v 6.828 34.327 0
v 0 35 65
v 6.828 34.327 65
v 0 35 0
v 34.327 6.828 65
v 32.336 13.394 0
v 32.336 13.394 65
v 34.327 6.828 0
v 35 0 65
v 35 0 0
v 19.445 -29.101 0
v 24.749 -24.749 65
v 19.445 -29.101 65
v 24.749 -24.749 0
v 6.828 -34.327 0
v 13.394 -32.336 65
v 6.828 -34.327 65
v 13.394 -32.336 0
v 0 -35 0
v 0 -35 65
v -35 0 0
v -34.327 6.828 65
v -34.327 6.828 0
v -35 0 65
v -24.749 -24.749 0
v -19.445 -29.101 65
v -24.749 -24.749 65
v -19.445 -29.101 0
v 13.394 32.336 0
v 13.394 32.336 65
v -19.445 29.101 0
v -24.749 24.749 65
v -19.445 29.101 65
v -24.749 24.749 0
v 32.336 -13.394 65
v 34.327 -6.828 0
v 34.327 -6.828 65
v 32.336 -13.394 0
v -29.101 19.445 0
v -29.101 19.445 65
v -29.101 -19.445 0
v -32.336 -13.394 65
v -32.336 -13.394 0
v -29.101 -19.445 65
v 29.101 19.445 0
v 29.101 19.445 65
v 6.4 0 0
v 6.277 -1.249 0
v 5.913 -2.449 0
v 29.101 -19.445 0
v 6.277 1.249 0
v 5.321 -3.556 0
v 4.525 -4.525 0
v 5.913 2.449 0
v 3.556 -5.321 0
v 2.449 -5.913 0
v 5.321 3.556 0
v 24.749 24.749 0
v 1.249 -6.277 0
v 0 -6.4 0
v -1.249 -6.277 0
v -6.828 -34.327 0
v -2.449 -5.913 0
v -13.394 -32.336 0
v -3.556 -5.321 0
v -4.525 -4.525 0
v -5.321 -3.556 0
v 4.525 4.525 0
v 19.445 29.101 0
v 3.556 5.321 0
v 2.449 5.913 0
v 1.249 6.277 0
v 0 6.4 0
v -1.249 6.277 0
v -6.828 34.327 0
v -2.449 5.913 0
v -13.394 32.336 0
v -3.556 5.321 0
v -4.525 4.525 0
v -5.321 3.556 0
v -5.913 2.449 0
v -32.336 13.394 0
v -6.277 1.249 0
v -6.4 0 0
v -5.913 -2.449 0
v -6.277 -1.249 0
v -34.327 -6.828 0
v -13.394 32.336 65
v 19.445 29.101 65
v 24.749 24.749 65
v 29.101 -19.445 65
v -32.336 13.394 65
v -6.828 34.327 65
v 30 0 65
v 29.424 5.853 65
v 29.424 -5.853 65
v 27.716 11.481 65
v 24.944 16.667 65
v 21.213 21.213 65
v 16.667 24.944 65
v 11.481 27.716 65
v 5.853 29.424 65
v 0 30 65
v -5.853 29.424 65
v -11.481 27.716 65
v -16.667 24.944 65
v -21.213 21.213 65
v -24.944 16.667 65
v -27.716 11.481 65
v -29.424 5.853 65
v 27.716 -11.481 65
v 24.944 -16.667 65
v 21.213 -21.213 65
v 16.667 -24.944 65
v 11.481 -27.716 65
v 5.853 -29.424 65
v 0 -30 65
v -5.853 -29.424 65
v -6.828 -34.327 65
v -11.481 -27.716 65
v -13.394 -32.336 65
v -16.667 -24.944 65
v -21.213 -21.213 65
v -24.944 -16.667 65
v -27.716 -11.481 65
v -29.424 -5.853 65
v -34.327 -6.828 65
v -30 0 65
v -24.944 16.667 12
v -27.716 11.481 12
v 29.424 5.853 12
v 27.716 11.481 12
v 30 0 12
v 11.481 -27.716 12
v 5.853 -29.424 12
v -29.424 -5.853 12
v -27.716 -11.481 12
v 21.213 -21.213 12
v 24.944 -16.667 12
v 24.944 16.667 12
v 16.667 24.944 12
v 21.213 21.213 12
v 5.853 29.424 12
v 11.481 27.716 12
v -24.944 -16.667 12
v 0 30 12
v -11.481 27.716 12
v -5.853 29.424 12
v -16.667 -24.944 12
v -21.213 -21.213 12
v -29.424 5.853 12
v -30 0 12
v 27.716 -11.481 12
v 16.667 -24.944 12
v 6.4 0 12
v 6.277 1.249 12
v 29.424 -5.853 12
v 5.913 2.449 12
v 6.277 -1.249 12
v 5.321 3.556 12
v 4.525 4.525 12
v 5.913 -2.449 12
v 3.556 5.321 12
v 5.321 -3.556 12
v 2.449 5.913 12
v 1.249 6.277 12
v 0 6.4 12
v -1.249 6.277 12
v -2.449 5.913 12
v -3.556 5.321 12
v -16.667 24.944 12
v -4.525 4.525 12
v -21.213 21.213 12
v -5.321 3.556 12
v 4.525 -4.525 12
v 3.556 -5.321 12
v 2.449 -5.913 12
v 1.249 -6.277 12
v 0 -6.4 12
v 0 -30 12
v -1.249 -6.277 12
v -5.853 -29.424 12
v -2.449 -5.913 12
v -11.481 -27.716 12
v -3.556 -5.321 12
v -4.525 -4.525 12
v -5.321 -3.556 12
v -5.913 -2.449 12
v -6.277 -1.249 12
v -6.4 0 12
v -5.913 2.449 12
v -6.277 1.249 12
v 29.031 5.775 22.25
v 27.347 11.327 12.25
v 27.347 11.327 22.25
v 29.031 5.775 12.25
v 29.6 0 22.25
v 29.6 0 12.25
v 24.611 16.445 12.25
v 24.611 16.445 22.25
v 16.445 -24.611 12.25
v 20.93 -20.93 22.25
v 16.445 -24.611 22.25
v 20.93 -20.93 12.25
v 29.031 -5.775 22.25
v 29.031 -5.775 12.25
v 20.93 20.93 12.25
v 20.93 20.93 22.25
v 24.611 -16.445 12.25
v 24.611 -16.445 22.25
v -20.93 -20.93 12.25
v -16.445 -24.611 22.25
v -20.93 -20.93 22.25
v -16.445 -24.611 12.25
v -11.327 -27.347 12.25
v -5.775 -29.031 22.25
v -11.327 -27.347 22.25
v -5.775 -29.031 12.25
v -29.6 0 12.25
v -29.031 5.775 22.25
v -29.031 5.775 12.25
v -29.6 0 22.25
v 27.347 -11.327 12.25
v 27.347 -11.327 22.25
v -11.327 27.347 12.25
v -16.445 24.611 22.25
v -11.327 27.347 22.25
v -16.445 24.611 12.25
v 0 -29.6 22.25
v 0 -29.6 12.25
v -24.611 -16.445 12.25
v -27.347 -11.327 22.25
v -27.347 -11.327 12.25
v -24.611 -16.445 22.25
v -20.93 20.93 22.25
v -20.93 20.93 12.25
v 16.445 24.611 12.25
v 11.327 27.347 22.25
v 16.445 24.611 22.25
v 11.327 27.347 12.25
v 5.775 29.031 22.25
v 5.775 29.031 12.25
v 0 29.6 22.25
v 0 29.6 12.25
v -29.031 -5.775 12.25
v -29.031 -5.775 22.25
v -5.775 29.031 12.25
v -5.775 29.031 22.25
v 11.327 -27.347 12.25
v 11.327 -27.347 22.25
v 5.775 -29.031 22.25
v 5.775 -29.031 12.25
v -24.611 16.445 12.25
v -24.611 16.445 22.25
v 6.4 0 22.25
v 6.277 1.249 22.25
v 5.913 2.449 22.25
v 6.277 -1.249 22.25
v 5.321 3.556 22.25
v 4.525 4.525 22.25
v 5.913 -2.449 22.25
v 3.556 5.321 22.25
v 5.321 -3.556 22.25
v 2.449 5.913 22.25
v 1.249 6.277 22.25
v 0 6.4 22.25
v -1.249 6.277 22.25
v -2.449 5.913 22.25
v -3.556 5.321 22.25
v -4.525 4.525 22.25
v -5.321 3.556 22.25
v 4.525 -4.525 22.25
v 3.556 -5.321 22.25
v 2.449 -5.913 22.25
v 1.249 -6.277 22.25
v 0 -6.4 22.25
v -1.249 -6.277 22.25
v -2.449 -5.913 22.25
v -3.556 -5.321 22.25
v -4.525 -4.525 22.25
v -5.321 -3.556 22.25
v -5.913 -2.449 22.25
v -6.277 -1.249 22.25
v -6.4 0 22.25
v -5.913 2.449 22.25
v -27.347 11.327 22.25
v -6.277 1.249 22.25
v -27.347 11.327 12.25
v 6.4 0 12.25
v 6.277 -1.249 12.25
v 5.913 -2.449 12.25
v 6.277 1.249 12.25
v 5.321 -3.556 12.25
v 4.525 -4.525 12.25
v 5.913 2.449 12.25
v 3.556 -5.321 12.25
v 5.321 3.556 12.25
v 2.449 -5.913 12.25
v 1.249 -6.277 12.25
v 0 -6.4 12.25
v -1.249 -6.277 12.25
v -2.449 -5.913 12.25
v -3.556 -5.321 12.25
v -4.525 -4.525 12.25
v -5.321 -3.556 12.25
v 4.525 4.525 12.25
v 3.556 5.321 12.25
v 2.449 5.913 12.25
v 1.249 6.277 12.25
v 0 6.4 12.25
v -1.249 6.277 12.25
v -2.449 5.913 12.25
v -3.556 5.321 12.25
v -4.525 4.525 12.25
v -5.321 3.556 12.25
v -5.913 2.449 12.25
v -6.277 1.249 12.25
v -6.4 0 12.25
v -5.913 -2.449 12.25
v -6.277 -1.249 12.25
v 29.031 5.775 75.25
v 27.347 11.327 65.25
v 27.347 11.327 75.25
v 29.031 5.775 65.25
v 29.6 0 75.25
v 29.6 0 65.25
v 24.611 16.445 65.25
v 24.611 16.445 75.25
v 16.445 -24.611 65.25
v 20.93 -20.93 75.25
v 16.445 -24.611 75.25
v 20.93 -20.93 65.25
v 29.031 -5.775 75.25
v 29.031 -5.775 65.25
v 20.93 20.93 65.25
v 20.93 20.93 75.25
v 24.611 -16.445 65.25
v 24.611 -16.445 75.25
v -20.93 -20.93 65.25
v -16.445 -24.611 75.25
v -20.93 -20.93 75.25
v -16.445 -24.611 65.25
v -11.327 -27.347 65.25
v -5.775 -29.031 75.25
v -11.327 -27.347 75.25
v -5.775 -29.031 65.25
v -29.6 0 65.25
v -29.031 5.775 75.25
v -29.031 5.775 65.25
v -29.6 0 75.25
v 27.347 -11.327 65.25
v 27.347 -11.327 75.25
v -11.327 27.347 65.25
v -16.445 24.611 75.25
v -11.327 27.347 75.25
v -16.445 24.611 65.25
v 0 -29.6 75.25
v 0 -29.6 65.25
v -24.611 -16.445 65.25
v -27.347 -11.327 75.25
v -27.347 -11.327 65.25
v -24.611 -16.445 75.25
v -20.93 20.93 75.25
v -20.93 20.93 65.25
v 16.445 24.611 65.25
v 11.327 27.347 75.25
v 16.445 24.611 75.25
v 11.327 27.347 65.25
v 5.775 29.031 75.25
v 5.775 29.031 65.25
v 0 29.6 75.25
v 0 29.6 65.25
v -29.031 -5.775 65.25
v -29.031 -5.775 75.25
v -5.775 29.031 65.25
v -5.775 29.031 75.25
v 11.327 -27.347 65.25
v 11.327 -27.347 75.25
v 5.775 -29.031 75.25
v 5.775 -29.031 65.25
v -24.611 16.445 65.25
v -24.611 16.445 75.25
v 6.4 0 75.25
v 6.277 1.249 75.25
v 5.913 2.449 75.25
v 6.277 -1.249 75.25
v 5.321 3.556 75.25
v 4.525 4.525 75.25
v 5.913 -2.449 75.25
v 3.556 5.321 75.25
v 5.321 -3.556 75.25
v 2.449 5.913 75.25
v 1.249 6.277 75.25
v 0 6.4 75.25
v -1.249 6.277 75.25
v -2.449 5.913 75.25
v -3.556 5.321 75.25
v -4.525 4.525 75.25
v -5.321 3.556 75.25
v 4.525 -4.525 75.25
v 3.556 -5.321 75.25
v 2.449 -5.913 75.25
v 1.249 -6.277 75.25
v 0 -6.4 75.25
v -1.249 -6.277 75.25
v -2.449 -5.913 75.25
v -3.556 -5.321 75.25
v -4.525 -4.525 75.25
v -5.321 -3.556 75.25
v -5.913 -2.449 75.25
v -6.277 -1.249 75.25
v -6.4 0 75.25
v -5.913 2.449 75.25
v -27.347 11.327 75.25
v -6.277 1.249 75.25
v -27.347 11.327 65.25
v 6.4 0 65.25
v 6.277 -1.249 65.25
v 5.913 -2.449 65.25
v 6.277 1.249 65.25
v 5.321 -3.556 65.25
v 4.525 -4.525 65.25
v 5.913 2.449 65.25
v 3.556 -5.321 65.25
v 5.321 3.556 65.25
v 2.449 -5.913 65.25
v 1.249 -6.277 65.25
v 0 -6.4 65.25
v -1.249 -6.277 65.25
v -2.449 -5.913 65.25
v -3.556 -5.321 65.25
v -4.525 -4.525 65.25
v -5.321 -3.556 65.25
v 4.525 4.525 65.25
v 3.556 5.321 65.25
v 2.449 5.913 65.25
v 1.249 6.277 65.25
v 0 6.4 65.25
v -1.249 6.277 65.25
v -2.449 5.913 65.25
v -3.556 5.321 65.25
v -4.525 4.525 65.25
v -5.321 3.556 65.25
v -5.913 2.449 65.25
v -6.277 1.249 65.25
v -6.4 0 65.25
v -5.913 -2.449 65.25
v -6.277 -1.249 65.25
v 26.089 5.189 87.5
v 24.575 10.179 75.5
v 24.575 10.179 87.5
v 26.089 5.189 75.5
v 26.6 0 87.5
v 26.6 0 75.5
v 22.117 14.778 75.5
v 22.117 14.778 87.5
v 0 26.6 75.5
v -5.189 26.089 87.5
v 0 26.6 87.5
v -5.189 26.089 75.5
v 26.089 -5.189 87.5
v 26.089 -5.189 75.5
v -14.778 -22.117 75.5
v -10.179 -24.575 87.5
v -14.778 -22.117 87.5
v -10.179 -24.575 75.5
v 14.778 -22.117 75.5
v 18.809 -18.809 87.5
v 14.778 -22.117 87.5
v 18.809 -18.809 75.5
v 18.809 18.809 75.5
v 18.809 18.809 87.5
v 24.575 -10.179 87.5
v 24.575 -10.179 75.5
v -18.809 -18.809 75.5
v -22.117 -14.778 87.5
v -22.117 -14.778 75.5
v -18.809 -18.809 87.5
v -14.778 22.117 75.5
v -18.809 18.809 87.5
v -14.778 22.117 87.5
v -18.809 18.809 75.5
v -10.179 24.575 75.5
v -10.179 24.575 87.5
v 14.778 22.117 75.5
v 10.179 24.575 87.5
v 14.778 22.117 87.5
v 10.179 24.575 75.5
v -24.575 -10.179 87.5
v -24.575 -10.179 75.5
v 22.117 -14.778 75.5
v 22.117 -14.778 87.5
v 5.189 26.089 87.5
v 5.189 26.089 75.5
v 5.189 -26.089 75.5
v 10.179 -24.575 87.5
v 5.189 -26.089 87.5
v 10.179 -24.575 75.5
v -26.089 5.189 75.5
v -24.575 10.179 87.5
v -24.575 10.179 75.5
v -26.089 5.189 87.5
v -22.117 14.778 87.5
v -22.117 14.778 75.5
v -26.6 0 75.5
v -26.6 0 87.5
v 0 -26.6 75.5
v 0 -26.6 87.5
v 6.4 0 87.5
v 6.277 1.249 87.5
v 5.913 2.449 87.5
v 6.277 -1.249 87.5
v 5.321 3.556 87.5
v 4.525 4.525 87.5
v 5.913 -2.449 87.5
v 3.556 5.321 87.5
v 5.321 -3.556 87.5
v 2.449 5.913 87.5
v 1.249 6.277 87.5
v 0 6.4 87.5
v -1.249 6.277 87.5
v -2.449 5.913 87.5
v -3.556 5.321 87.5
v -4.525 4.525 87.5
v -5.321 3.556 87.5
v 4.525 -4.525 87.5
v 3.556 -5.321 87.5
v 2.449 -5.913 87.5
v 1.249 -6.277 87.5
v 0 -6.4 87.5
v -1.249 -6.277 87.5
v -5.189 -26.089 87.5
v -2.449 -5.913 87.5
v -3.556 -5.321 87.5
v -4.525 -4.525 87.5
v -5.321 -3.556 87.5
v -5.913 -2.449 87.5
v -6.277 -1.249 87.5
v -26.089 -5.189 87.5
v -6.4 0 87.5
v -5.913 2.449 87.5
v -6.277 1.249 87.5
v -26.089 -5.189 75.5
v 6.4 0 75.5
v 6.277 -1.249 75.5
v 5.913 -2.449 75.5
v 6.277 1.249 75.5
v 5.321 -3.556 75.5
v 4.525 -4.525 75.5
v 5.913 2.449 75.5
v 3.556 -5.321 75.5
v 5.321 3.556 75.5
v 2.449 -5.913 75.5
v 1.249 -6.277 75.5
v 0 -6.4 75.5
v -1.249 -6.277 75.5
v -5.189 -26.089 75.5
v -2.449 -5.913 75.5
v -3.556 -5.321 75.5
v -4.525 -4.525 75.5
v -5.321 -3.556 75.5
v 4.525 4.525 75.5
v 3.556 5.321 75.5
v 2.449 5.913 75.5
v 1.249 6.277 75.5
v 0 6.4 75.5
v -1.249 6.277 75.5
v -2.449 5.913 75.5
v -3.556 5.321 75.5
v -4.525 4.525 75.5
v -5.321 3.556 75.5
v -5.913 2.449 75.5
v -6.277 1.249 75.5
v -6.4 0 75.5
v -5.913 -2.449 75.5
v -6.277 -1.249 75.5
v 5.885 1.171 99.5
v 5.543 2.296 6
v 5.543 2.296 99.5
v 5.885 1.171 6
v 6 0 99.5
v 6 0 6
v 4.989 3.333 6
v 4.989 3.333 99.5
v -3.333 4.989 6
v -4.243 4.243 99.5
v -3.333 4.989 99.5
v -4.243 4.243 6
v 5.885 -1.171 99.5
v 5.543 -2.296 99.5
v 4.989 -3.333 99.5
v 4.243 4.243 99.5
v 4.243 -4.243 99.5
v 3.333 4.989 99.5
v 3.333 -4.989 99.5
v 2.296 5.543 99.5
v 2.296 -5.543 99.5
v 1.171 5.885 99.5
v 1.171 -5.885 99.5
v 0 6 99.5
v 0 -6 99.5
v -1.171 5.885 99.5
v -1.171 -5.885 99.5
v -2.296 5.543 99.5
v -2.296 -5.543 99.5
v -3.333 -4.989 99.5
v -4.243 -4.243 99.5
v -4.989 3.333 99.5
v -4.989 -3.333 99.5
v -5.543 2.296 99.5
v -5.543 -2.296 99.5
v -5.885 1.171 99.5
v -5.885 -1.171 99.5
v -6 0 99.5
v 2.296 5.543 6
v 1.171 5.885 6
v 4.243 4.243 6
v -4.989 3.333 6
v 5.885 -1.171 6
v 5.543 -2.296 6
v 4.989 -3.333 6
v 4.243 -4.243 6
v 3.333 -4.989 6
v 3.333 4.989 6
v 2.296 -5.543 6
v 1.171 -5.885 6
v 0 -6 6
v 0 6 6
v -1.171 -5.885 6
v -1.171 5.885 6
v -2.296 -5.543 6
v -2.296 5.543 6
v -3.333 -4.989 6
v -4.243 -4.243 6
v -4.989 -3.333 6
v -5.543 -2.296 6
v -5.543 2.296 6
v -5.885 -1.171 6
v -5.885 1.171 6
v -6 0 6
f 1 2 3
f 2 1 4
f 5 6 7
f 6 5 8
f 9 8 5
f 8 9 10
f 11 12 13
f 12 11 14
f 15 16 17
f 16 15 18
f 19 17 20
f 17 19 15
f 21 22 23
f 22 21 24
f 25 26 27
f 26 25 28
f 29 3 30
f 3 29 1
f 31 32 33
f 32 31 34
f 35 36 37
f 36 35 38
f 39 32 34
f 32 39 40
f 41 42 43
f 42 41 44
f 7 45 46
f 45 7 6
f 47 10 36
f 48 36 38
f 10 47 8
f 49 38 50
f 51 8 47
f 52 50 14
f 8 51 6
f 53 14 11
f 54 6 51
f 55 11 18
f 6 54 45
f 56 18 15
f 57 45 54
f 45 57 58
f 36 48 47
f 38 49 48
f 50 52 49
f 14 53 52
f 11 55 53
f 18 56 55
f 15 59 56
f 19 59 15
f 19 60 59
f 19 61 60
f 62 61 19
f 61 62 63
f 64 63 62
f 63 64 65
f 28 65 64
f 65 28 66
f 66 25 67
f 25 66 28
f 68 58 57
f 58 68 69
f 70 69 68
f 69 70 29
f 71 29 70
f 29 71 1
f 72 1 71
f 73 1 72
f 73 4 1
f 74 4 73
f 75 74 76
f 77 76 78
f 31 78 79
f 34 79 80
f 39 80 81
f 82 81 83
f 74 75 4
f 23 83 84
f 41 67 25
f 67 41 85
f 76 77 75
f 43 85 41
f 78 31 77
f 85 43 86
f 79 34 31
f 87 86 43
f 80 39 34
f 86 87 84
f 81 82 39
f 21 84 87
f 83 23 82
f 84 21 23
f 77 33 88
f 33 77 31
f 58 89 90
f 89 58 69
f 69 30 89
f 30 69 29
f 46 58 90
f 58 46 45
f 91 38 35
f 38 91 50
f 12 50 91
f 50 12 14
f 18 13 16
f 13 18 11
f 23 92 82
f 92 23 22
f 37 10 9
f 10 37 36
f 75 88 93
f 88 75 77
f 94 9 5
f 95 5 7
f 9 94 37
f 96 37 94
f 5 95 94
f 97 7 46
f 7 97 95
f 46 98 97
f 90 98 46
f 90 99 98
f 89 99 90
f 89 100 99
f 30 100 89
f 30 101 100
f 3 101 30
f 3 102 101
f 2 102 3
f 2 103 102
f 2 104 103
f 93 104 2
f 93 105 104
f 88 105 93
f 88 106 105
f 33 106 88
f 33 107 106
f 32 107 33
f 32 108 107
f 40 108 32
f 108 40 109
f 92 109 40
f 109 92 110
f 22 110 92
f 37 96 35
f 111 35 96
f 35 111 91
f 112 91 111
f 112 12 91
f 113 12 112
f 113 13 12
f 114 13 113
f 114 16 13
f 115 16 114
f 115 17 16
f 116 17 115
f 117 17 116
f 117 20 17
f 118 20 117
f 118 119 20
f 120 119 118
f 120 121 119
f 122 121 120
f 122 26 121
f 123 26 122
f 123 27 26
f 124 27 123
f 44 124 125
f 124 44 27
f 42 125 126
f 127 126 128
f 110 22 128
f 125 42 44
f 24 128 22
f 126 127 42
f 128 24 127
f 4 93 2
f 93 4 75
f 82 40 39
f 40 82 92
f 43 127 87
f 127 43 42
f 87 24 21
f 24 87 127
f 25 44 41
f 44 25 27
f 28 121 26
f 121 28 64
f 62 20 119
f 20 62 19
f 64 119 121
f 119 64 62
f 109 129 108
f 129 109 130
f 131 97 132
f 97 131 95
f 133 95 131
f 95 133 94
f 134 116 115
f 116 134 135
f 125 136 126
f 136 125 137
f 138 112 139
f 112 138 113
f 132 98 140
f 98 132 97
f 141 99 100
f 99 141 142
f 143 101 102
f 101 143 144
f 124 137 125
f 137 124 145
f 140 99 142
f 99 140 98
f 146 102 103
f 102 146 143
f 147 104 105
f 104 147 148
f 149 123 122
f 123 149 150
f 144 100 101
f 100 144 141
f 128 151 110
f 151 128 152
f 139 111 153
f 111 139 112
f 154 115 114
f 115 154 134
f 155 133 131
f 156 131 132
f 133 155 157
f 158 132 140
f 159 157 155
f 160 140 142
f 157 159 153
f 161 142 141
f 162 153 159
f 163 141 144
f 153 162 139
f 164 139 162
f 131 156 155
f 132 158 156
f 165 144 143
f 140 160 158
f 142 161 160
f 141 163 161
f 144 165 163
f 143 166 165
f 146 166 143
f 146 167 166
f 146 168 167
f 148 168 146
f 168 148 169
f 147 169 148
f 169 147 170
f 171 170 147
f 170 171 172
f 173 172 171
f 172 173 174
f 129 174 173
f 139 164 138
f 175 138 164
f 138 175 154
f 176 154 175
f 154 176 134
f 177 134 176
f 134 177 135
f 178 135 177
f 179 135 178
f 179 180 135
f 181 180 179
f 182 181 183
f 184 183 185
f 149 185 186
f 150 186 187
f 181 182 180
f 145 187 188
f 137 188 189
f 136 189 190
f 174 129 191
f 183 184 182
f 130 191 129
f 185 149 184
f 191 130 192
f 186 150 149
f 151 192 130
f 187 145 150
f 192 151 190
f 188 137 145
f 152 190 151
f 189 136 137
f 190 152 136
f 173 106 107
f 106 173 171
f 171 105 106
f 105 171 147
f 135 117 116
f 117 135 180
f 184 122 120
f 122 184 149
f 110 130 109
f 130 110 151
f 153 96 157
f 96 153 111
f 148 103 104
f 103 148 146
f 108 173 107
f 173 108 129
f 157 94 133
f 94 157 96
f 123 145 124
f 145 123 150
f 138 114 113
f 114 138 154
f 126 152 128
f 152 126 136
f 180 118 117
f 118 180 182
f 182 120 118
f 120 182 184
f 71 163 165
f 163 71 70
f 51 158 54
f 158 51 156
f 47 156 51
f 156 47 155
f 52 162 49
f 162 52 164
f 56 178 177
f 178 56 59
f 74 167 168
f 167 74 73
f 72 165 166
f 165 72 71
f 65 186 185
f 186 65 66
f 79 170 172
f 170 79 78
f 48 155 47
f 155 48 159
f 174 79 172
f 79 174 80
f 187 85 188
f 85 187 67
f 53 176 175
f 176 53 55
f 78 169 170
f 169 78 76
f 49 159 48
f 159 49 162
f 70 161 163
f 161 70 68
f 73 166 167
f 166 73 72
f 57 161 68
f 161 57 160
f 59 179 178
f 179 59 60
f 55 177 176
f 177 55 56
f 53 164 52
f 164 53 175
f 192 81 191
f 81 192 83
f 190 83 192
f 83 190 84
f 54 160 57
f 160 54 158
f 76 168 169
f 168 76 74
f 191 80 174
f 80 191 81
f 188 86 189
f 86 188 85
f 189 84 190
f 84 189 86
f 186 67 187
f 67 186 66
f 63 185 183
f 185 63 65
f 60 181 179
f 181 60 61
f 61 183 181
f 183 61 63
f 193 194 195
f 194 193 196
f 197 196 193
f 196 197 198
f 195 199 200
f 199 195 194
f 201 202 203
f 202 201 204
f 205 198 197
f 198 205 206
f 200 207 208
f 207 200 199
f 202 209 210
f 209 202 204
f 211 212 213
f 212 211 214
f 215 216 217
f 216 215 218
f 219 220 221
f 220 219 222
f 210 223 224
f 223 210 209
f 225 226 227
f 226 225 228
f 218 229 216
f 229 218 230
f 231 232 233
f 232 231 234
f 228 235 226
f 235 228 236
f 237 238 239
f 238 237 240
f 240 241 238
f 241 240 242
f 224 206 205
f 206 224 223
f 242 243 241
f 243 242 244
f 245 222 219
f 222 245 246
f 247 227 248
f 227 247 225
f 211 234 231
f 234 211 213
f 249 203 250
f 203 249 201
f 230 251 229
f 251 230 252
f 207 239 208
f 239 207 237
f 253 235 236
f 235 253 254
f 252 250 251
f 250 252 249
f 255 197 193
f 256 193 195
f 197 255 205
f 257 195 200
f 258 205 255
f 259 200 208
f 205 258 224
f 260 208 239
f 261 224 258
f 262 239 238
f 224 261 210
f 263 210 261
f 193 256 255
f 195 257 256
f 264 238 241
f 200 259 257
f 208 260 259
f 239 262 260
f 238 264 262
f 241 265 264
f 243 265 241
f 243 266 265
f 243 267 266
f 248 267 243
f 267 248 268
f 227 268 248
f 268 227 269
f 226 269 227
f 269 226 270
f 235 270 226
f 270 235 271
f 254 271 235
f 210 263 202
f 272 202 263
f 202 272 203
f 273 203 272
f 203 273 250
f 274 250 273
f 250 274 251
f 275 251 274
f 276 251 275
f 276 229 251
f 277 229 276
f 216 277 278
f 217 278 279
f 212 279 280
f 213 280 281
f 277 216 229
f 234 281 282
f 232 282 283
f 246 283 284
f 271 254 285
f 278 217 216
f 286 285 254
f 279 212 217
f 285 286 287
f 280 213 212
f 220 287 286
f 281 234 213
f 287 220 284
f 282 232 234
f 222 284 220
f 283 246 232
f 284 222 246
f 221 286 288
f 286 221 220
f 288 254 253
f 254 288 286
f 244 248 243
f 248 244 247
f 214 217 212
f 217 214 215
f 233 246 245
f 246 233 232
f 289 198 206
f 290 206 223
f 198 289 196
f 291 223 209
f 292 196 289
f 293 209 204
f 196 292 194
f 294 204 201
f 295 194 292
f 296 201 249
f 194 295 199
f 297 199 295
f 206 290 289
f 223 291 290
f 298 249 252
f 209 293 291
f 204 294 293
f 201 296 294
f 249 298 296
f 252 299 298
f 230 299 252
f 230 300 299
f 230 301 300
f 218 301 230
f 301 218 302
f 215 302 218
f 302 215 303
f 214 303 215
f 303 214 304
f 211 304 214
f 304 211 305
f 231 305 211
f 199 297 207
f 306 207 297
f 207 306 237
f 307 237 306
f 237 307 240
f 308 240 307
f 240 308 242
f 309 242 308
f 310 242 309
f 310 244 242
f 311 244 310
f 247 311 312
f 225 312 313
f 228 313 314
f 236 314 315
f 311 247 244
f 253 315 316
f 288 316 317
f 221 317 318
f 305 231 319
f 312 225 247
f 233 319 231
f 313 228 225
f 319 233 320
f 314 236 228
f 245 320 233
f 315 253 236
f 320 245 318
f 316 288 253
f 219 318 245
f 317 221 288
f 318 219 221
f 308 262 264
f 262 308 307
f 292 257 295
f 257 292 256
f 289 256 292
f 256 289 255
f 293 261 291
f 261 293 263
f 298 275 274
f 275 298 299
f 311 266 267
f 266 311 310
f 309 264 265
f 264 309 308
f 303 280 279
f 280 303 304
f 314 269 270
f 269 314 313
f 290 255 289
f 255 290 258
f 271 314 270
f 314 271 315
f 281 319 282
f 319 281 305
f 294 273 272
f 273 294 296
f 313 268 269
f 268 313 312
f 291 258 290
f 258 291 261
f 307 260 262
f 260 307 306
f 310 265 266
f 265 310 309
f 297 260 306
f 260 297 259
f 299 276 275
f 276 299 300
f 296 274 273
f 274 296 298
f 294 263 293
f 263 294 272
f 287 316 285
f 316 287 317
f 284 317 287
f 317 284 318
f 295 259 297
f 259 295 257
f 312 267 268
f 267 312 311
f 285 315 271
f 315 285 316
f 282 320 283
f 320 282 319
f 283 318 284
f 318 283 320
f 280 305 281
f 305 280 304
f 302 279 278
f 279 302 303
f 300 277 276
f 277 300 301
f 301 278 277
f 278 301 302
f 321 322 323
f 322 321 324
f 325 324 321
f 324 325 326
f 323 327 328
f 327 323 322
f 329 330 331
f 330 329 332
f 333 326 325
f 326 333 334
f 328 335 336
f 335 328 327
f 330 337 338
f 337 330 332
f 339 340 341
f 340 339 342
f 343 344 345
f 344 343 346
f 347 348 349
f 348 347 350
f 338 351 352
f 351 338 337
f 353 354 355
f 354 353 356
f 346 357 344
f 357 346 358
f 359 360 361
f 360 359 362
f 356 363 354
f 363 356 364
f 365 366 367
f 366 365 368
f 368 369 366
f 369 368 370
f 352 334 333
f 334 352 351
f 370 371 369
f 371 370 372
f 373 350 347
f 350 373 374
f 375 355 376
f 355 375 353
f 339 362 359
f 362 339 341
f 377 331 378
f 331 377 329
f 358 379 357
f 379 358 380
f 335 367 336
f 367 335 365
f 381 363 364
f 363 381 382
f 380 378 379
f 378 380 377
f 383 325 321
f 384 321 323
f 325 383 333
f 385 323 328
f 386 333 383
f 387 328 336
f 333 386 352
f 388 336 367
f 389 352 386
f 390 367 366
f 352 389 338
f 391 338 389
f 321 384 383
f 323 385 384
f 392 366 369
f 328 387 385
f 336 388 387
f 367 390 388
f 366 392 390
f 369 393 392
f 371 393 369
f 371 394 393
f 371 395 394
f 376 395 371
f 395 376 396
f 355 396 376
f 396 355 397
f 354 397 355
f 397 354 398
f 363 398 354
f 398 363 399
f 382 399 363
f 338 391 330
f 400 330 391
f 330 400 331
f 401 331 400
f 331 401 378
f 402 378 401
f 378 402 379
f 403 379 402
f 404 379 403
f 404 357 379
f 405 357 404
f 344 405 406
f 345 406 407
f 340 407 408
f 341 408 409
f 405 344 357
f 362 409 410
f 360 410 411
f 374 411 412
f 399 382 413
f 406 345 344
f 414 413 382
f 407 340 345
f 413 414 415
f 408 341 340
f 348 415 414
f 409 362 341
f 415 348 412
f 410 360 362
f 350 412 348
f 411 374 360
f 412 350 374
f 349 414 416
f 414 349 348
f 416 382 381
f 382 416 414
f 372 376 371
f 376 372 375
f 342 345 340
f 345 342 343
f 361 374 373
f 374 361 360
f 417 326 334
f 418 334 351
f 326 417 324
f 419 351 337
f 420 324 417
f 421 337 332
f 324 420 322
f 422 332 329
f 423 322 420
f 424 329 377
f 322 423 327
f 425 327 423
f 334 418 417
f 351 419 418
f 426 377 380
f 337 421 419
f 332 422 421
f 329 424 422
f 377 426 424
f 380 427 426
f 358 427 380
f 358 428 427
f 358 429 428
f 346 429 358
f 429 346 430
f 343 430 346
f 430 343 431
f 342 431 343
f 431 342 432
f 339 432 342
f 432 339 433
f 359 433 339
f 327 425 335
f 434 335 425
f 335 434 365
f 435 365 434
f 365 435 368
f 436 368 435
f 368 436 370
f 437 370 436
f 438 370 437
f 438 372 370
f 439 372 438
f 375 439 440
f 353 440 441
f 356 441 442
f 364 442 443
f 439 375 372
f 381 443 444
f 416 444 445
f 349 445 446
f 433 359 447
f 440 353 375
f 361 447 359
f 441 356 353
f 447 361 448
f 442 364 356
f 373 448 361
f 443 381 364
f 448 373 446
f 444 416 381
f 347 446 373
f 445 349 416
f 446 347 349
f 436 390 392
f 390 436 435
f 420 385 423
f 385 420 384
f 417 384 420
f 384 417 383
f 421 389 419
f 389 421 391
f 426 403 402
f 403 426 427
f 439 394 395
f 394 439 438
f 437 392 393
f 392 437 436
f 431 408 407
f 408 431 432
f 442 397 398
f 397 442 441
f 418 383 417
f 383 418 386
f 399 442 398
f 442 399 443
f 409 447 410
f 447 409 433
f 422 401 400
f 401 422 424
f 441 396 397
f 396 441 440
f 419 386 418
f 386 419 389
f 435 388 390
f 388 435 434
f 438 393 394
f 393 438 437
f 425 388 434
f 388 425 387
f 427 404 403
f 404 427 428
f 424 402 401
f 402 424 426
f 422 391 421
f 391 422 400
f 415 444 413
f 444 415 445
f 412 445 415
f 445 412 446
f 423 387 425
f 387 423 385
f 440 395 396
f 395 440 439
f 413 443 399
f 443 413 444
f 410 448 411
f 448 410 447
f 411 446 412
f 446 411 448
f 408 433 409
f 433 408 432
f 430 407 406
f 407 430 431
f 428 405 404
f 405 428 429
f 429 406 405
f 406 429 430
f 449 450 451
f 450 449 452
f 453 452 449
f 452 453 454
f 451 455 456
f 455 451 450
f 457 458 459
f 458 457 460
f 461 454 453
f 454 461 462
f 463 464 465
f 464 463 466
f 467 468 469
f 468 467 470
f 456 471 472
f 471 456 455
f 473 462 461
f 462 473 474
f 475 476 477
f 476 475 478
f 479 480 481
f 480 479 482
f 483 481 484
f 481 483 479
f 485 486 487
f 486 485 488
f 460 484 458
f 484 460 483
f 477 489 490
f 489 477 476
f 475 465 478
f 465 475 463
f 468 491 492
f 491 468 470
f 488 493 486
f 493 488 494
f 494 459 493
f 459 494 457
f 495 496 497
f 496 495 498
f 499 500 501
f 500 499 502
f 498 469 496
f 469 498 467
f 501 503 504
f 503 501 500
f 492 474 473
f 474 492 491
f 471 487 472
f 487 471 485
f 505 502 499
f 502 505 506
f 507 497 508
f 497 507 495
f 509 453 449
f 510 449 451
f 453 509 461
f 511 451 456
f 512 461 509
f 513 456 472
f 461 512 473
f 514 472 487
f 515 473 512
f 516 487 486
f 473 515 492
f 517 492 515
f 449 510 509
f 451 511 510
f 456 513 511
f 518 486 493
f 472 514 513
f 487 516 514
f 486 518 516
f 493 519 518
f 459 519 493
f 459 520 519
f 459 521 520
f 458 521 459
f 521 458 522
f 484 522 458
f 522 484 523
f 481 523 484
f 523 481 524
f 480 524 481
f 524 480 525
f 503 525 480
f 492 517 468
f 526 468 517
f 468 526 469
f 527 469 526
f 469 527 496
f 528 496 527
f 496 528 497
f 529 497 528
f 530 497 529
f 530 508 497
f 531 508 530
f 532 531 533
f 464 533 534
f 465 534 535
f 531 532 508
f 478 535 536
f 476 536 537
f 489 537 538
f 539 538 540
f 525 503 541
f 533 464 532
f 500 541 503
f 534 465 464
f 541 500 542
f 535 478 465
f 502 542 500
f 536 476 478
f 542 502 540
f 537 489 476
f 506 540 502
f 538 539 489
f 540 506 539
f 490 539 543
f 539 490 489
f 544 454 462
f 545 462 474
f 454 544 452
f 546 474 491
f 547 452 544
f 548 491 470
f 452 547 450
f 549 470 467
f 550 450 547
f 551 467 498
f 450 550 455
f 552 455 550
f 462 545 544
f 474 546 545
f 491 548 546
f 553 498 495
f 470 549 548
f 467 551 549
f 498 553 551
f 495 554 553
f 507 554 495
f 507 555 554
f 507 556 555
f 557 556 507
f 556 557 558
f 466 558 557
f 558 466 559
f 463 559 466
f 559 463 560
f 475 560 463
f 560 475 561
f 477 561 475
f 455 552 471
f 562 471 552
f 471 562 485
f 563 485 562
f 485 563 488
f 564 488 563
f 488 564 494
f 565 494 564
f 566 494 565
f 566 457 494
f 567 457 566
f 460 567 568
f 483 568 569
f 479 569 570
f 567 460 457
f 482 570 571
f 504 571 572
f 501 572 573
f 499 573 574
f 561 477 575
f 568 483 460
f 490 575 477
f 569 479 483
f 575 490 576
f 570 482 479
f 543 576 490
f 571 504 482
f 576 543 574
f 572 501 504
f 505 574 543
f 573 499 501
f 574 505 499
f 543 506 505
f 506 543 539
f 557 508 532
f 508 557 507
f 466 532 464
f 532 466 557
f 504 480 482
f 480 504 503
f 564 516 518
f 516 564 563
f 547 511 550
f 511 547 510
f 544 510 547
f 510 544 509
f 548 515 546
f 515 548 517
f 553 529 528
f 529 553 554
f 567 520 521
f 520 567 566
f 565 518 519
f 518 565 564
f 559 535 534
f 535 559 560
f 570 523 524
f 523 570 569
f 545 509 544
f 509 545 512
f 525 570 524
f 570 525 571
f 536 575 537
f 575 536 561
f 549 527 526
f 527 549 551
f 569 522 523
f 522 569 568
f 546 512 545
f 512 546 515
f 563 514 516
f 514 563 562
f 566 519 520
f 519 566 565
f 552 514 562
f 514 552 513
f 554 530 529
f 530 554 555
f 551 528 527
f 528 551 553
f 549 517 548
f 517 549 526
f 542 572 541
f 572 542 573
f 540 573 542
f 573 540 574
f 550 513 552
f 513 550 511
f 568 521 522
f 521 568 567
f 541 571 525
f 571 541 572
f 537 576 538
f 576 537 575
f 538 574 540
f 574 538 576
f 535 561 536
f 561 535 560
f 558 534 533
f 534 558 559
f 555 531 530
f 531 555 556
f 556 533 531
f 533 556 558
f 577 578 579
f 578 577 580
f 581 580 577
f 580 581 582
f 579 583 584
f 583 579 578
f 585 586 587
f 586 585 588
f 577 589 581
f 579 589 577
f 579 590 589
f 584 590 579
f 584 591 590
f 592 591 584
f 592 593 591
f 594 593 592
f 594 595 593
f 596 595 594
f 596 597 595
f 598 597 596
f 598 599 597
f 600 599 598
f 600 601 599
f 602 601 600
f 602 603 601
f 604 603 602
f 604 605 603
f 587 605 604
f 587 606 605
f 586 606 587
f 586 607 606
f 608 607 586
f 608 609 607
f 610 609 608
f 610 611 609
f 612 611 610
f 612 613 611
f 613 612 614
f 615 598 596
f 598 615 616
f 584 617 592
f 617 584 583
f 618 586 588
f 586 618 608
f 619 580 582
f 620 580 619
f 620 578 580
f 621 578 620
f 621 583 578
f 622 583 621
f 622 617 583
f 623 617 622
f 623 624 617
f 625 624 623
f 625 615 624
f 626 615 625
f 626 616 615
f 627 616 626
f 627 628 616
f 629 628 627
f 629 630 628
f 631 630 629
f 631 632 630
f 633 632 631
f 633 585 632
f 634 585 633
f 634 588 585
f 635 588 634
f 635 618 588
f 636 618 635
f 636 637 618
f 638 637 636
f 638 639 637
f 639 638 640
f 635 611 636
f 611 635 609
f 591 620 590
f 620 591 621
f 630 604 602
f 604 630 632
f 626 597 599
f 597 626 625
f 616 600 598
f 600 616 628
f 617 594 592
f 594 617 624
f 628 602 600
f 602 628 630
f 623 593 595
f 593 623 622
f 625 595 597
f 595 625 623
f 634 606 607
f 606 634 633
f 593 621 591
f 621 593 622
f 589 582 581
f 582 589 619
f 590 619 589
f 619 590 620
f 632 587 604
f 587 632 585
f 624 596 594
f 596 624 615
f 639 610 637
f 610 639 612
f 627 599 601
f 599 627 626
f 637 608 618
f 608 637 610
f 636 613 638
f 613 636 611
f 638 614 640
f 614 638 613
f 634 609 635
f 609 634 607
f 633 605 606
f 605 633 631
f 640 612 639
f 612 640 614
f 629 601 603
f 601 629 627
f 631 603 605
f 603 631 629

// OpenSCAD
$fn = 32;

// ------------------------------------------------------------------------
// Bearing housing: housing d70, two bearings and a shaft
// Every part is its own module, assembly() places them once.
// ------------------------------------------------------------------------

// --- part 1 ---
module housing() {
  difference() {
    cylinder(h = 65, d = 70);
    translate([0, 0, 12]) cylinder(h = 54, d = 60);
    translate([0, 0, -1]) cylinder(h = 14, d = 12.8);
  }
}

// --- part 2 ---
module bearing_lower() {
  difference() {
      translate([0, 0, 0]) cylinder(h = 10, d = 59.2);
      translate([0, 0, -1]) cylinder(h = 12, d = 12.8);
    }
}

// --- part 3 ---
module bearing_upper() {
  difference() {
      translate([0, 0, 0]) cylinder(h = 10, d = 59.2);
      translate([0, 0, -1]) cylinder(h = 12, d = 12.8);
    }
}

// --- part 4 ---
module spacer() {
  difference() {
      translate([0, 0, 0]) cylinder(h = 12, d = 53.2);
      translate([0, 0, -1]) cylinder(h = 14, d = 12.8);
    }
}

// --- part 5 ---
module shaft() {
  translate([0, 0, -46.75]) cylinder(h = 93.5, d = 12);
}

// --- assembly ---
module assembly() {
  translate([0, 0, 0]) rotate([0, 0, 0]) housing();
  translate([0, 0, 12.25]) rotate([0, 0, 0]) bearing_lower();
  translate([0, 0, 65.25]) rotate([0, 0, 0]) bearing_upper();
  translate([0, 0, 75.5]) rotate([0, 0, 0]) spacer();
  translate([0, 0, 52.75]) rotate([0, 0, 0]) shaft();
}

assembly();
